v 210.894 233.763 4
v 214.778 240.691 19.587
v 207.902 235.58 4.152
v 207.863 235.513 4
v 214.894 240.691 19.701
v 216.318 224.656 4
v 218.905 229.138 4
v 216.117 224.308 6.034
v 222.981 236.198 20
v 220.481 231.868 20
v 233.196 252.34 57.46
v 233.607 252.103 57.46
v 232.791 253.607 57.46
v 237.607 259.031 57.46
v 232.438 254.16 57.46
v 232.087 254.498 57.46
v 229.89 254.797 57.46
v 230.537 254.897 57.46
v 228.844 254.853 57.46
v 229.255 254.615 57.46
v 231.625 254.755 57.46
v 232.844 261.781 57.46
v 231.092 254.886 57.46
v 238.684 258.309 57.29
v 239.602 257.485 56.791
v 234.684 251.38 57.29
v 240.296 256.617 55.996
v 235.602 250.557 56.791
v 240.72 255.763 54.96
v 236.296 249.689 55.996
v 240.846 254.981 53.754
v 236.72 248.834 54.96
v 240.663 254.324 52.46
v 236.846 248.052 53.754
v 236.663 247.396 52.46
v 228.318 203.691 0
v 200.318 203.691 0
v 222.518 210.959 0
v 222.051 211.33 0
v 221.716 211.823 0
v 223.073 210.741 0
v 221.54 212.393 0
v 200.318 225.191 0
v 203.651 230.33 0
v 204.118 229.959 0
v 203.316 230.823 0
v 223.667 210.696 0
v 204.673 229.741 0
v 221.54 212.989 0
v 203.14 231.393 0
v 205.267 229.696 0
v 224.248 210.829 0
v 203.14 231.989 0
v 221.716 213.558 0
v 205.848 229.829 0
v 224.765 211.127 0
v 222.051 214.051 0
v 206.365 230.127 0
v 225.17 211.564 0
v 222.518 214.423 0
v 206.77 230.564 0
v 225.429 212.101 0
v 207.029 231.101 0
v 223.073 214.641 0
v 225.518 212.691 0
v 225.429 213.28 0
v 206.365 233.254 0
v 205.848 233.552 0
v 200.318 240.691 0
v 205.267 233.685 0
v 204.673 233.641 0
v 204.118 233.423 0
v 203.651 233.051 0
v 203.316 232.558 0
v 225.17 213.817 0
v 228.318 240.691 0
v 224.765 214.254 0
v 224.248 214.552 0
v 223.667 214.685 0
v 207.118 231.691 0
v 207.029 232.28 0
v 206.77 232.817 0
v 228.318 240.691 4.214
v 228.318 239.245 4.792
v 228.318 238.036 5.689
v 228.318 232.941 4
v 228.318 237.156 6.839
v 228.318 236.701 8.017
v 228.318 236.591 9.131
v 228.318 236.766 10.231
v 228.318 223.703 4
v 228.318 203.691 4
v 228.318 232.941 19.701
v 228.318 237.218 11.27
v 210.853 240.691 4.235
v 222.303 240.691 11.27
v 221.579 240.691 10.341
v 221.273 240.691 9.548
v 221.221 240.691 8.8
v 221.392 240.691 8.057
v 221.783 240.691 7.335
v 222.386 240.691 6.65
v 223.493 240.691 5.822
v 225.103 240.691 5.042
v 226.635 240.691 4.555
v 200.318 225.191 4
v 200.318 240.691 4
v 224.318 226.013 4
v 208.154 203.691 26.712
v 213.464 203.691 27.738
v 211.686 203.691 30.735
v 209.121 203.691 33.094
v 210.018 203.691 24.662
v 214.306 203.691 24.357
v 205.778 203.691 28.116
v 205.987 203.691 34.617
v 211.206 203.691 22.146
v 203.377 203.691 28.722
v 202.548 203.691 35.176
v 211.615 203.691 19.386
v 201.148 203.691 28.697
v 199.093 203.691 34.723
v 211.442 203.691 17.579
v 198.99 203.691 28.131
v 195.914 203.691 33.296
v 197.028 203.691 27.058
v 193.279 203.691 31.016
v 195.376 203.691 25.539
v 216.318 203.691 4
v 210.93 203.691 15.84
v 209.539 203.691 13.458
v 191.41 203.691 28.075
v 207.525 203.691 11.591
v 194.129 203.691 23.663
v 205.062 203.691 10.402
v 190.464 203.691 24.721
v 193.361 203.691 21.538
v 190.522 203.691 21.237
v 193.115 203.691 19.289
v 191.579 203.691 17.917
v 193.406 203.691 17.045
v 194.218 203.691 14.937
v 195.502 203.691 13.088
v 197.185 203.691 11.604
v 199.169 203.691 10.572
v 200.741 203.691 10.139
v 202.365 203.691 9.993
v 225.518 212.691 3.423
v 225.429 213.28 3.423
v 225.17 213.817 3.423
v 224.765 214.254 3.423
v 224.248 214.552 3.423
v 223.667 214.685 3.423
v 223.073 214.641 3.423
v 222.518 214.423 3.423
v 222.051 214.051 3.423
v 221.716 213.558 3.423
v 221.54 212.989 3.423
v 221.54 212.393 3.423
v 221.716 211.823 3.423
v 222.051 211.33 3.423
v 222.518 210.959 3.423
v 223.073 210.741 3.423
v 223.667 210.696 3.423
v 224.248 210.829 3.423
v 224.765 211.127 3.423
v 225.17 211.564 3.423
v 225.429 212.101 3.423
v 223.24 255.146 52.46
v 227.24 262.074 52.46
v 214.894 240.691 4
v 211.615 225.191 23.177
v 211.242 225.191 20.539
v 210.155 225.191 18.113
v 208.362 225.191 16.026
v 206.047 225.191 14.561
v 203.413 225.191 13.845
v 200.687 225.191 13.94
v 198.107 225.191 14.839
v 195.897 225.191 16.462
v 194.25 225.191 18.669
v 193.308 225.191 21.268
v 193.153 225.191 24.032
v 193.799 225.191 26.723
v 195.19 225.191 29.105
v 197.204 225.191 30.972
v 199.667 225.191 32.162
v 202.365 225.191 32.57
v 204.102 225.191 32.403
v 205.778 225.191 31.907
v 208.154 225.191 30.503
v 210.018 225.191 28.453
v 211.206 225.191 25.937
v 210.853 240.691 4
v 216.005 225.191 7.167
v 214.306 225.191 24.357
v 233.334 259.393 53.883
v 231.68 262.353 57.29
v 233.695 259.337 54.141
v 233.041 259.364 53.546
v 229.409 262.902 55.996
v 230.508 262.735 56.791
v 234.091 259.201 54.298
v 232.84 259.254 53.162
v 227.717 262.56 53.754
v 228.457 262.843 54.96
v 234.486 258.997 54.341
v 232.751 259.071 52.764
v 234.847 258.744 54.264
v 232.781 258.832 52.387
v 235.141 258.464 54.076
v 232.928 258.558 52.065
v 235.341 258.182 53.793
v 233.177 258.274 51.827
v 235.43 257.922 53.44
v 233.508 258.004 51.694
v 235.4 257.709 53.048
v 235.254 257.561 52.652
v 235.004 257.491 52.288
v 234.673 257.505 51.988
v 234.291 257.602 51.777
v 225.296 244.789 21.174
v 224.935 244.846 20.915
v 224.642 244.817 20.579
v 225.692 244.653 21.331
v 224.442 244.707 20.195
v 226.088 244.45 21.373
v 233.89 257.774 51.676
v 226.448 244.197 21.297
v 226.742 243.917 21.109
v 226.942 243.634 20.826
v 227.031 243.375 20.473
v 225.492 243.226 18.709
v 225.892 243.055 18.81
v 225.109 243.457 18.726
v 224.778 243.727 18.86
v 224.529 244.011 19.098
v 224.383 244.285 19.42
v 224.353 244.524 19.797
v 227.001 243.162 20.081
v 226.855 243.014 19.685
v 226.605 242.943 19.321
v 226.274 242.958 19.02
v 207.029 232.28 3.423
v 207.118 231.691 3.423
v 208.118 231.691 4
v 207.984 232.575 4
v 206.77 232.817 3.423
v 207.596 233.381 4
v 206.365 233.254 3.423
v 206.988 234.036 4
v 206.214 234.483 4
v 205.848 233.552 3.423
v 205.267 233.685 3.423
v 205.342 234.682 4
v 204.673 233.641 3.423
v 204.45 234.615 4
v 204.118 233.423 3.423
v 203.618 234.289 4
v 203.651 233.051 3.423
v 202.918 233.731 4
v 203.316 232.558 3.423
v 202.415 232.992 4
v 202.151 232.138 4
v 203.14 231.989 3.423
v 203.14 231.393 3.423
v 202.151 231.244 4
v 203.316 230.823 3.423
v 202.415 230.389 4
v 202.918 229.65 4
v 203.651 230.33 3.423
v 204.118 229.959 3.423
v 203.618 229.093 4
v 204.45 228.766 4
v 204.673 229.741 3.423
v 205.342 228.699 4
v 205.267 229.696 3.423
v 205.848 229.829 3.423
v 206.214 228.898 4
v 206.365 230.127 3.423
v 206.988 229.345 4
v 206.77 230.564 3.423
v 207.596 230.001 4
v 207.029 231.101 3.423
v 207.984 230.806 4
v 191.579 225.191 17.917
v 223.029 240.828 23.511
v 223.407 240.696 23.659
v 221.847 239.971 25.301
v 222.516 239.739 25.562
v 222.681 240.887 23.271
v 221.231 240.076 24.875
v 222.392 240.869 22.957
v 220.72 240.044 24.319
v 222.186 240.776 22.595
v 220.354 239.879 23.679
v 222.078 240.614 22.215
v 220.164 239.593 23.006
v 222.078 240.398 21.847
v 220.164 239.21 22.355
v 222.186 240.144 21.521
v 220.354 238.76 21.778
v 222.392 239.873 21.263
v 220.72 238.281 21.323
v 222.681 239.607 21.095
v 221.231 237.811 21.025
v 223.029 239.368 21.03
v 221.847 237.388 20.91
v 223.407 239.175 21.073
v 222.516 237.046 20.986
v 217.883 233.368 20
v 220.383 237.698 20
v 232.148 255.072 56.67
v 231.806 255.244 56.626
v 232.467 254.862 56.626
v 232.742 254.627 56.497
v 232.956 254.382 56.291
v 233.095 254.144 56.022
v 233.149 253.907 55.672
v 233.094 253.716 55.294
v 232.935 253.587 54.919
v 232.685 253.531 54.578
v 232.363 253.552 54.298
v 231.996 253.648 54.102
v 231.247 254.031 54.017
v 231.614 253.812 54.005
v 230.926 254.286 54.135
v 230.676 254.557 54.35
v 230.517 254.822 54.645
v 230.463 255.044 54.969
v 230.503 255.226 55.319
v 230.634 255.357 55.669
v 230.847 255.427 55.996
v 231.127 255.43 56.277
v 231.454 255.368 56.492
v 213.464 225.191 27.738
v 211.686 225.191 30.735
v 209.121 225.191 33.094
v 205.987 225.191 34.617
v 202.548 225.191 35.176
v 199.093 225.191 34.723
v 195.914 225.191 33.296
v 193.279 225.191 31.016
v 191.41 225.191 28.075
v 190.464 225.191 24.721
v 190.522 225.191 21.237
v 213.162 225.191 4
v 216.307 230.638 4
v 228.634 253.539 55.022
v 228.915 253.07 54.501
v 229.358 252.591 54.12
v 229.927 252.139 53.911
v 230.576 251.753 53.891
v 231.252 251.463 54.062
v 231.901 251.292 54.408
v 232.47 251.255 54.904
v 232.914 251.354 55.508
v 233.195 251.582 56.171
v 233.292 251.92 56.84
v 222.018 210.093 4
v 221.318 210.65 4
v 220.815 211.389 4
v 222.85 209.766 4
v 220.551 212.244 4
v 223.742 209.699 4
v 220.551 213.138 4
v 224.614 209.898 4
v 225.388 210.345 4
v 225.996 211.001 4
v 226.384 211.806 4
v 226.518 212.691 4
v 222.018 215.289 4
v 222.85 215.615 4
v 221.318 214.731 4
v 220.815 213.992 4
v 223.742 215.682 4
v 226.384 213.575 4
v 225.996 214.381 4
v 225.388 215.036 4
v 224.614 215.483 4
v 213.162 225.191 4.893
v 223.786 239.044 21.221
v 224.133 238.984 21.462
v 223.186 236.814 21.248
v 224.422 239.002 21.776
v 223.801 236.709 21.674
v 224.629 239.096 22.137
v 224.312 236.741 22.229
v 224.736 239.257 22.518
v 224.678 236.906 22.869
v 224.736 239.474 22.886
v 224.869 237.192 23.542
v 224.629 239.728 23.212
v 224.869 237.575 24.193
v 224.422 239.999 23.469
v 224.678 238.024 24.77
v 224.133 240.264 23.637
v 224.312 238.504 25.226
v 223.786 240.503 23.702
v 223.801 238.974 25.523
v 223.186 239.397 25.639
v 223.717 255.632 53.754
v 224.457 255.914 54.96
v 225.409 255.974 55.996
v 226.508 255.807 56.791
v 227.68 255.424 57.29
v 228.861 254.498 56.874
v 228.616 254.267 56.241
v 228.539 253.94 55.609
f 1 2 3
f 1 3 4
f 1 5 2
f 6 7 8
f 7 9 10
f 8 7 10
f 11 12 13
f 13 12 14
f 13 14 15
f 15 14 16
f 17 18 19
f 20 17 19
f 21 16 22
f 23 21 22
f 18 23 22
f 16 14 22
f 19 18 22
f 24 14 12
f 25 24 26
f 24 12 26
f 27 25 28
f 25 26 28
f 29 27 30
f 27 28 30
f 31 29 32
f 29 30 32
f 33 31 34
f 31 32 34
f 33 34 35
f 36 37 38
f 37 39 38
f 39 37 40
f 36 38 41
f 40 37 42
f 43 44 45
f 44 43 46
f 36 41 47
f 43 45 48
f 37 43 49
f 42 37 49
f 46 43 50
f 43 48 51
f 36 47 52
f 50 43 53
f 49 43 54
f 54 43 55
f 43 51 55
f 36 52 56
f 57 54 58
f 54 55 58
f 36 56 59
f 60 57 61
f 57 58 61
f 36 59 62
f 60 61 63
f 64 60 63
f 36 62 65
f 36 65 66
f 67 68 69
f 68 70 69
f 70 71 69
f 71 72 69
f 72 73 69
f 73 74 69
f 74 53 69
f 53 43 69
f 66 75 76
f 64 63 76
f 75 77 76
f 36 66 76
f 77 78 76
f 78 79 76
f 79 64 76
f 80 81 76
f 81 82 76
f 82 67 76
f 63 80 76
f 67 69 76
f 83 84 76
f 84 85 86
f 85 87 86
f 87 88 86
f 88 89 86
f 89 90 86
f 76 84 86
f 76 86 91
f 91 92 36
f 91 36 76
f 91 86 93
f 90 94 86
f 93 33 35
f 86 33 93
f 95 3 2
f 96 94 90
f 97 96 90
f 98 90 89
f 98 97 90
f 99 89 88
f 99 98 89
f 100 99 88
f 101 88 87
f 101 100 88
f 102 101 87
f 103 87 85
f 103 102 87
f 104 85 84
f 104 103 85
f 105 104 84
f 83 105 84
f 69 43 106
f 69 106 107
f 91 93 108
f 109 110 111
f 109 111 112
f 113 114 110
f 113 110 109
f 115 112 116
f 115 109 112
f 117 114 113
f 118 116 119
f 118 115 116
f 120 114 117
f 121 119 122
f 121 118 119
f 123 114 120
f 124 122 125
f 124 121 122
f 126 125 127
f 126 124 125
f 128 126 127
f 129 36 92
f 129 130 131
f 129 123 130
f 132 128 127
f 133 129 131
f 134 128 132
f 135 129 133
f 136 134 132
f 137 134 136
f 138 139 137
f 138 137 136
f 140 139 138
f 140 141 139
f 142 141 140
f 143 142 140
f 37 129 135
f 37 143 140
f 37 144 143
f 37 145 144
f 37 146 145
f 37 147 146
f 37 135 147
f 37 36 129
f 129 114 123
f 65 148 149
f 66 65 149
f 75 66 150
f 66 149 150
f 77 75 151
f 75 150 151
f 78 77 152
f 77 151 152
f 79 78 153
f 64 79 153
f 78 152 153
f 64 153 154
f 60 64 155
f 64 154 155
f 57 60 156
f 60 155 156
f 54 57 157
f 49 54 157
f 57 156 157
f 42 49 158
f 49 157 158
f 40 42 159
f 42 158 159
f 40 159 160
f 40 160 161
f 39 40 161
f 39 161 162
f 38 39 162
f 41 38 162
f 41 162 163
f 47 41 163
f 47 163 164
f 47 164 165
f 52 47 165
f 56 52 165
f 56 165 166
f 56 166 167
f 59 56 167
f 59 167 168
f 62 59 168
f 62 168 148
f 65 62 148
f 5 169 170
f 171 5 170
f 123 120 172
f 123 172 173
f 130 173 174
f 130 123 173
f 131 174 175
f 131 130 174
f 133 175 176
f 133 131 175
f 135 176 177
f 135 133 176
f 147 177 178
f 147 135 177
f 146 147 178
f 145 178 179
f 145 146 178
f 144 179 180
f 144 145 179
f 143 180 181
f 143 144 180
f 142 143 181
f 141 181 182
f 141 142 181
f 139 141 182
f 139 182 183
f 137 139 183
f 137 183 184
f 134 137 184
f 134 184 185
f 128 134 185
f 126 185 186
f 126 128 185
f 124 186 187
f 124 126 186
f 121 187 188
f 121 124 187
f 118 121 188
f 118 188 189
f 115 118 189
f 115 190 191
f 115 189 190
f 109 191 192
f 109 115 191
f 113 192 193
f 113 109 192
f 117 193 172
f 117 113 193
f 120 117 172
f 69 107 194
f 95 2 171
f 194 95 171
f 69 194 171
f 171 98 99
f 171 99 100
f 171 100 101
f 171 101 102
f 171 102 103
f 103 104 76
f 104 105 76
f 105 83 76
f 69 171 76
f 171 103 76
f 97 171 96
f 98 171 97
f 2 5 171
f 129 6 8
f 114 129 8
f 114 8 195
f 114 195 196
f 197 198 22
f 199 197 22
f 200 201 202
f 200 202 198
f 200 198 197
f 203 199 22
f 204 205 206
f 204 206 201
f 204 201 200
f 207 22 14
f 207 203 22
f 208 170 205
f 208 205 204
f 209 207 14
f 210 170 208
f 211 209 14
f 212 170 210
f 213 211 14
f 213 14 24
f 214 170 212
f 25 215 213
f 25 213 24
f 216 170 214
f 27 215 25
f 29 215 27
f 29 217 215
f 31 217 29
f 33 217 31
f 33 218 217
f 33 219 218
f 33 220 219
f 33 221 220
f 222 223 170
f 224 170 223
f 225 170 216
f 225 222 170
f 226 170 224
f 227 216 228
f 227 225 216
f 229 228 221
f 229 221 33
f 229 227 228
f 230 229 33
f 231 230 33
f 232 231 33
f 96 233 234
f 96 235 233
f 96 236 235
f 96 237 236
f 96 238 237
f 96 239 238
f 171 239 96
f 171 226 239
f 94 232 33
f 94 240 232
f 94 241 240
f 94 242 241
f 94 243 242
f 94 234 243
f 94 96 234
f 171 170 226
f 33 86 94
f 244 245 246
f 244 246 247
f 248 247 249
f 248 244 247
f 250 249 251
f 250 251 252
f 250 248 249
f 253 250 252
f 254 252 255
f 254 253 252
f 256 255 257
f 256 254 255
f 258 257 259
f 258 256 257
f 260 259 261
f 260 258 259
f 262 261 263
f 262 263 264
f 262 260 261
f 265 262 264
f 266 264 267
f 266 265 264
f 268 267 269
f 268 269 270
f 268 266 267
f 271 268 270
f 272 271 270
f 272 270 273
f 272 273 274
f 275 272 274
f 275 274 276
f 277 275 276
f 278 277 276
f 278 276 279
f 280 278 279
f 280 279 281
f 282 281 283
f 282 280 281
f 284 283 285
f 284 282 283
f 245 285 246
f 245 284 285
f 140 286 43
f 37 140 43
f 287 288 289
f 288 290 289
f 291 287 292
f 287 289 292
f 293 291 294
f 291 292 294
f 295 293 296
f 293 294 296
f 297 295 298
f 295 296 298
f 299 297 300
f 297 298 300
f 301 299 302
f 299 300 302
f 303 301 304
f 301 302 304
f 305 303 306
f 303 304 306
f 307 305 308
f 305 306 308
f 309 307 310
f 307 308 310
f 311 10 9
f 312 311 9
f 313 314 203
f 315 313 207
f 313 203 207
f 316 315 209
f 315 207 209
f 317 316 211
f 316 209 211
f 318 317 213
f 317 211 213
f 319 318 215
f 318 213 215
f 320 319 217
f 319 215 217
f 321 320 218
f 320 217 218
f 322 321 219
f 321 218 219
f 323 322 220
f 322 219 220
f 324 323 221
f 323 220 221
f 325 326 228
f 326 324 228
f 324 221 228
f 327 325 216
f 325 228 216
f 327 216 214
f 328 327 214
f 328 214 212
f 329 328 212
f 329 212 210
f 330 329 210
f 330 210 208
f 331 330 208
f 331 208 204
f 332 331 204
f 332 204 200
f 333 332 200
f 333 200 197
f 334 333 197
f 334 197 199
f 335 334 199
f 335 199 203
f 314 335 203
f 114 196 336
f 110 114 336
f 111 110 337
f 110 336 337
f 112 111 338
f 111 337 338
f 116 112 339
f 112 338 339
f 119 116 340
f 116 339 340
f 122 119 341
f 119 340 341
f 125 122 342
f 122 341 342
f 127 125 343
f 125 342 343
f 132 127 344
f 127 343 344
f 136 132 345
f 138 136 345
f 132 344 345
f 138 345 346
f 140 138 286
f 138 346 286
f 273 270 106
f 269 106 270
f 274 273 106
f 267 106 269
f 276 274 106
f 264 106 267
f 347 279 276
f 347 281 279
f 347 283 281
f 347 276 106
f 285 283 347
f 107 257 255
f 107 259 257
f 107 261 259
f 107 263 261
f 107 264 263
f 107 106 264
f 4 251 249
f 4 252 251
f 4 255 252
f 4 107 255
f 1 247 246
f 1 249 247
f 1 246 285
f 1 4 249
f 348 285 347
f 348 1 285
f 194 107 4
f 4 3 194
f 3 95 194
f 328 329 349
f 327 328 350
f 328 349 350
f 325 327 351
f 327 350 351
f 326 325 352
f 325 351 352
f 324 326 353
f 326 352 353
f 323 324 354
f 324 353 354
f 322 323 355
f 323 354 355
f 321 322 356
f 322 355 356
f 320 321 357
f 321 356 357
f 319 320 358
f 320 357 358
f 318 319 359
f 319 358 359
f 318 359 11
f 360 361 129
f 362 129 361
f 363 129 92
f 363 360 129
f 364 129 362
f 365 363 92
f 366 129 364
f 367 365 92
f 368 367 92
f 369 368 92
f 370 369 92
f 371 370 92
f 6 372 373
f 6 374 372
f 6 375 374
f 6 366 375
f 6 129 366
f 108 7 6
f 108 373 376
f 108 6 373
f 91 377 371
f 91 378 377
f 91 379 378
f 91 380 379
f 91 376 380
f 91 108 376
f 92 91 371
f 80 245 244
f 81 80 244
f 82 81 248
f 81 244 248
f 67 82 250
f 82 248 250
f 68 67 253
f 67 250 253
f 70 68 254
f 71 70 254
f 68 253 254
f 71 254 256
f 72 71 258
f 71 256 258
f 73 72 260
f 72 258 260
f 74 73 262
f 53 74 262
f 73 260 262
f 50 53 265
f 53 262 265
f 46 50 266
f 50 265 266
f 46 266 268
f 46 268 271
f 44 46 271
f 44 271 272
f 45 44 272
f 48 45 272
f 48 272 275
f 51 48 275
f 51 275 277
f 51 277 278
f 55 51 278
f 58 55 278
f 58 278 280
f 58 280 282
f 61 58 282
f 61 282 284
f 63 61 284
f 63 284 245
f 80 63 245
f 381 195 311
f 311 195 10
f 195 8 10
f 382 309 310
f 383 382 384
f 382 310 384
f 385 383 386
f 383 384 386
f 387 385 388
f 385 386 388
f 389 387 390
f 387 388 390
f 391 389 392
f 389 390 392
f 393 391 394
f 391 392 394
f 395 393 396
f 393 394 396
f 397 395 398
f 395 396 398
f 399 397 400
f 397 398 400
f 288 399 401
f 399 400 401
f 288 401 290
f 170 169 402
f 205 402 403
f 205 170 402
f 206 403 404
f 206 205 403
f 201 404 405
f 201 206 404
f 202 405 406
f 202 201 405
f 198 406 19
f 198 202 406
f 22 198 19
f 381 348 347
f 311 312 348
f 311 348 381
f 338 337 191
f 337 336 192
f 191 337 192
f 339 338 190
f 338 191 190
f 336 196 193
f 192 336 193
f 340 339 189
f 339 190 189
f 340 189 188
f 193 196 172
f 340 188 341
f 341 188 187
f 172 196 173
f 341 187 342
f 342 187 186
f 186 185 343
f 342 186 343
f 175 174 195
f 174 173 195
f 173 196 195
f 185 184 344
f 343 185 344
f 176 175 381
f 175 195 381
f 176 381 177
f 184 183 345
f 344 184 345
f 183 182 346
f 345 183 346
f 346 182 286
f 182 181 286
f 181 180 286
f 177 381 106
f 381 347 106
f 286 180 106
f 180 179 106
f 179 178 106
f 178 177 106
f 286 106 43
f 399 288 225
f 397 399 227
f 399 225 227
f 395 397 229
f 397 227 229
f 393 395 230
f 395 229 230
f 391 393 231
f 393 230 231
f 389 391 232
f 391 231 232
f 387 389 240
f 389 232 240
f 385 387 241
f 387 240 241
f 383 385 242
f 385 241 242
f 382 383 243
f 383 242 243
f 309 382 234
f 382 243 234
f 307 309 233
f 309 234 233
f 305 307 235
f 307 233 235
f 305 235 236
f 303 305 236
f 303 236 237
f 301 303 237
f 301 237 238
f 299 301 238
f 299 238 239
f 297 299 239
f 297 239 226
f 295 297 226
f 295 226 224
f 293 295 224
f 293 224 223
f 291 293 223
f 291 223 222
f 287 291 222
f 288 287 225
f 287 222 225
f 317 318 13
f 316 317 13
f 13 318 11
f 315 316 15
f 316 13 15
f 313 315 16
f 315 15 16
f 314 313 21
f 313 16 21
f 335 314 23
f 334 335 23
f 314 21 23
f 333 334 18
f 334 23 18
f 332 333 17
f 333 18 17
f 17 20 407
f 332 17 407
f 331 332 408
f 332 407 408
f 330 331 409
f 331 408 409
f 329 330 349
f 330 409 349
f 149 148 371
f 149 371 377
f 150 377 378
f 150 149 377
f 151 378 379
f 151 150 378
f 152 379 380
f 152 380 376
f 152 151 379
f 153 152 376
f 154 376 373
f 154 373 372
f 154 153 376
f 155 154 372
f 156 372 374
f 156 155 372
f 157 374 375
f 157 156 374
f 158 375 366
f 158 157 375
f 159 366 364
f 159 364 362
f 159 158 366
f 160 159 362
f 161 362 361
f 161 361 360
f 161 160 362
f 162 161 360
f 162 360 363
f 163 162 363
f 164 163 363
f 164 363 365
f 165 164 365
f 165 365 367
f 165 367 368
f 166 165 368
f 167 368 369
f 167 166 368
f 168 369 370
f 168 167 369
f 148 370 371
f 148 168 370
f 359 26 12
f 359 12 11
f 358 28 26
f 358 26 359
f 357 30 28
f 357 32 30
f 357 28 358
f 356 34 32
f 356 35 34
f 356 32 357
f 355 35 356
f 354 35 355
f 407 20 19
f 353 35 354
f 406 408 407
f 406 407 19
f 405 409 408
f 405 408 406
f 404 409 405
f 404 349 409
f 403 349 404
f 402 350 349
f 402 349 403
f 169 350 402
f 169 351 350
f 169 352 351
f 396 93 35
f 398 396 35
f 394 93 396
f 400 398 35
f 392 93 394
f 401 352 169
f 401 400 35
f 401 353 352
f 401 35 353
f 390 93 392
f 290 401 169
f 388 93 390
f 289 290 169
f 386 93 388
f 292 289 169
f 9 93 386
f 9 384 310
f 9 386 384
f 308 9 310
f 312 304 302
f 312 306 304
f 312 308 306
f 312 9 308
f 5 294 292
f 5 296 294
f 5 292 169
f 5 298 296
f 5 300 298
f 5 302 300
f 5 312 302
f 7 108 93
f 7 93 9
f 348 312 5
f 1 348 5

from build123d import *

# Parameters (mm, degrees)
SKETCH1_W                       = 28
SKETCH1_H                       = 37
BOSS_EXTRUDE1_DEPTH             = 4
EXTRUDE_THIN1_DEPTH             = 60
BOSS_EXTRUDE2_DEPTH             = 18.5
BOSS_EXTRUDE2_DEPTH_BACK        = 3
SKETCH5_R                       = 12
BOSS_EXTRUDE4_REACH             = 356.551
BOSS_EXTRUDE4_DIRECTION_2_DEPTH = 19
CUT_EXTRUDE2_DEPTH              = 363.265046463
CHAMFER1_START                  = 52.77449686
CHAMFER1_DEPTH                  = 8.045724116
FILLET1_R                       = 5
SKETCH12_R                      = 2
CUT_EXTRUDE3_DEPTH              = 11
CHAMFER3_SIZE                   = 1
CHAMFER3_SIZE2                  = 0.577350269
RIB2_START                      = -1.5
RIB2_DEPTH                      = 3
SKETCH13_R                      = 1.5
CUT_EXTRUDE6_DEPTH              = 11
FILLET2_R                       = 5
CUT_REVOLVE_START               = 202.331523811
CUT_REVOLVE_3_OUTLINE_R         = 9.25
CUT_REVOLVE_3_DEPTH             = 25.093721499


with BuildPart() as part:
    # Sketch1 → Boss-Extrude1 (new body)
    with BuildSketch(Plane.XY):
        with Locations((214.317546036, 222.190706617)):
            Rectangle(SKETCH1_W, SKETCH1_H)
    extrude(amount=BOSS_EXTRUDE1_DEPTH)

    # Sketch4 → Extrude-Thin1 (add, along a direction that is not the sketch's normal)
    with BuildSketch(Plane.XY.offset(4)):
        Polygon((214.894152277, 240.690706617), (228.317546036, 232.940706617), (224.317546036, 226.012503387), (210.894152277, 233.762503387), align=None)
    extrude(amount=EXTRUDE_THIN1_DEPTH, dir=(0.22699524986977232, 0.3931673058512374, 0.8910065241883693))

    # Sketch5 → Boss-Extrude2 (add, two sides: drawn at the far end of the back side and taken through both)
    with BuildSketch(Plane(origin=(0, 222.190706617, 0), x_dir=(-1, 0, 0), z_dir=(0, -1, 0)).offset(-BOSS_EXTRUDE2_DEPTH_BACK)):
        with BuildLine():
            Line((-191.578997844, -17.916678927), (-200.317546036, 0))
            Line((-200.317546036, 0), (-216.317546036, 0))
            Line((-216.317546036, 0), (-216.317546036, -4))
            Line((-216.317546036, -4), (-214.306389256, -24.35692569))
            ThreePointArc((-214.306389256, -24.35692569), (-205.636142491, -11.631721126), (-191.578997844, -17.916678927))
        make_face()
        with Locations((-202.3645264, -23.177132689)):
            Circle(SKETCH5_R)
    extrude(amount=BOSS_EXTRUDE2_DEPTH + BOSS_EXTRUDE2_DEPTH_BACK)

    # Boss-Extrude4: up to this face of the body (flat: up to its plane)
    boss_extrude4_end = Plane(part.part.faces().sort_by_distance((228.317546036, 222.190706617, 2))[0])
    # Sketch7 → Boss-Extrude4 (add, up to the picked face)
    with BuildSketch(Plane(origin=(70.371874774, -40.629220844, 0), x_dir=(0, 0, -1), z_dir=(0.8660254037844386, -0.5, 0)), mode=Mode.PRIVATE) as boss_extrude4_sk1:
        Polygon((-4, 315.891342524), (-19.700884044, 315.891342524), (-4, 307.891342524), align=None)
    boss_extrude4_tool1 = split(extrude(boss_extrude4_sk1.sketch, amount=BOSS_EXTRUDE4_REACH, mode=Mode.PRIVATE), bisect_by=boss_extrude4_end, keep=Keep.BOTH, mode=Mode.PRIVATE)
    add(boss_extrude4_tool1.solids().sort_by(Axis((226.984213, 230.631306, 9.233628), (0.8660254037844386, -0.5, 0)))[0])

    # Sketch7 → Boss-Extrude4 direction 2 (add)
    with BuildSketch(Plane(origin=(70.371874774, -40.629220844, 0), x_dir=(0, 0, -1), z_dir=(0.8660254037844386, -0.5, 0))):
        Polygon((-4, 315.891342524), (-19.700884044, 315.891342524), (-4, 307.891342524), align=None)
    extrude(amount=-BOSS_EXTRUDE4_DIRECTION_2_DEPTH)

    # Sketch8 → Cut-Extrude2 (cut, through all)
    with BuildSketch(Plane(origin=(0, 0, 4), x_dir=(-1, 0, 0), z_dir=(0, 0, -1))):
        Polygon((-214.894152277, 240.690706617), (-210.852700393, 240.690706617), (-211.863063364, 242.440706617), align=None)
    extrude(amount=-CUT_EXTRUDE2_DEPTH, mode=Mode.SUBTRACT)

    # Chamfer1: read off the stored shape, not the designer's step
    # Chamfer1 outline → Chamfer1 (cut)
    with BuildSketch(Plane(origin=(0, 0, 0), x_dir=(0.5316074109578968, 0.7735134037427047, 0.3450660441785277), z_dir=(0.8469908857919558, -0.48548982616312697, -0.21657808771308096)).offset(CHAMFER1_START)):
        Polygon((307.114108085, -80.169957731), (294.178723025, -92.183926772), (299.729695769, -94.190354162), align=None)
    extrude(amount=CHAMFER1_DEPTH, mode=Mode.SUBTRACT)

    # Fillet1
    # the kernel refuses this fillet: 5 mm, written as the material it adds along each edge
    with BuildSketch(Plane(origin=(197.228839574, 250.889779662, 4), x_dir=(0.49999999999999944, 0.8660254037844389, 0), z_dir=(0.866025403784439, -0.4999999999999995, 0))) as fillet1_piece_1_section:
        with BuildLine():
            CenterArc((FILLET1_R * 1.63185168713, FILLET1_R), FILLET1_R, 153, 117)
            Line((FILLET1_R * 0.74084516294, FILLET1_R * 1.45399049974), (0, 0))
            Line((0, 0), (FILLET1_R * 1.63185168713, 0))
        make_face()
    fillet1_piece_1 = extrude(amount=56.296292178, mode=Mode.PRIVATE)
    fillet1_piece_1 = split(fillet1_piece_1, bisect_by=Plane(origin=(228.317546036, 250.889779662, 4), z_dir=(-1, 0, 0)), keep=Keep.TOP, mode=Mode.PRIVATE)
    fillet1_piece_1 = split(fillet1_piece_1, bisect_by=Plane(origin=(197.228839574, 240.690706617, 4), z_dir=(0, -1, 0)), keep=Keep.TOP, mode=Mode.PRIVATE)
    add(fillet1_piece_1)

    # Sketch12 → Cut-Extrude3 (cut)
    with BuildSketch(Plane.XY.offset(4)):
        with Locations((205.117546036, 231.690706617)):
            Circle(SKETCH12_R)
        with Locations((223.517546036, 212.690706617)):
            Circle(SKETCH12_R)
    extrude(amount=-CUT_EXTRUDE3_DEPTH, mode=Mode.SUBTRACT)

    # Chamfer3
    chamfer3_edges = [part.edges().sort_by_distance(p)[0] for p in [
        (203.117546036, 231.690706617, 4),
        (221.517546036, 212.690706617, 4),
    ]]
    chamfer3_side = [part.faces().sort_by_distance(p)[0] for p in [
        (208.956042358, 238.333607157, 4),
    ]]
    chamfer(chamfer3_edges, length=CHAMFER3_SIZE, length2=CHAMFER3_SIZE2, reference=chamfer3_side[0])

    # Rib2: read off the stored shape, not the designer's step
    # Rib2 outline → Rib2 (add)
    with BuildSketch(Plane(origin=(63.660177895, -36.754220844, 0), x_dir=(-0.49999999999999845, -0.8660254037844396, 0), z_dir=(-0.8660254037844396, 0.49999999999999845, 0)).offset(RIB2_START)):
        Polygon((-301.043749716, 4), (-311.043749716, 20), (-316.043749716, 20), (-307.891342524, 4), align=None)
    extrude(amount=RIB2_DEPTH)

    # Sketch13 → Cut-Extrude6 (cut)
    with BuildSketch(Plane(origin=(124.582886752, 215.783889609, -126.956302744), x_dir=(0.8952803155791154, -0.38397537070557247, 0.2259116447376676), z_dir=(0.44550326209418484, 0.7716342848848018, -0.45399049973954403))):
        with Locations(Location((122.316663554, -176.73795859, 0), (0, 0, 270))):
            Circle(SKETCH13_R)
        with Locations(Location((112.935440602, -140.94700085, 0), (0, 0, 270))):
            Circle(SKETCH13_R)
    extrude(amount=-CUT_EXTRUDE6_DEPTH, mode=Mode.SUBTRACT)

    # Fillet2
    fillet2_edges = [part.edges().sort_by_distance(p)[0] for p in [
        (239.937261028, 253.066643353, 57.460391451),
        (226.51386727, 260.816643353, 57.460391451),
    ]]
    fillet(fillet2_edges, radius=FILLET2_R)

    # Chamfer4: read off the stored shape, not the designer's step
    # Chamfer4: loft between two sections, ruled curve by curve
    chamfer4_from = [
        Edge.make_three_point_arc((233.094750309, 254.144111481, 56.022204084), (231.428373697, 255.374841148, 56.47881494), (230.517297529, 254.821743623, 54.644687533)),
        Edge.make_three_point_arc((230.517297529, 254.821743623, 54.644687533), (232.183674141, 253.591013956, 54.188076677), (233.094750309, 254.144111481, 56.022204084)),
    ]
    chamfer4_to = [
        Edge.make_three_point_arc((233.195805822, 252.340022177, 57.460391452), (230.246651896, 254.518167985, 58.268501508), (228.634228967, 253.539295786, 55.022462165)),
        Edge.make_three_point_arc((228.634228967, 253.539295786, 55.022462165), (231.583382893, 251.361149979, 54.214352108), (233.195805822, 252.340022177, 57.460391452)),
    ]
    chamfer4 = Solid(Shell([*[Face.make_surface_from_curves(chamfer4_from[k], chamfer4_to[k]) for k in range(2)], Face(Wire(chamfer4_from)), Face(Wire(chamfer4_to))]))
    add(chamfer4, mode=Mode.SUBTRACT)

    # Chamfer4 2: loft between two sections, ruled curve by curve
    chamfer4_2_from = [
        Edge.make_three_point_arc((223.407199674, 240.696376934, 23.659041313), (222.064279201, 240.511700292, 22.027336946), (223.407199674, 239.175097537, 21.073367514)),
        Edge.make_three_point_arc((223.407199674, 239.175097537, 21.073367514), (224.750120147, 239.359774179, 22.705071881), (223.407199674, 240.696376934, 23.659041313)),
    ]
    chamfer4_2_to = [
        Edge.make_three_point_arc((222.51619315, 239.738649078, 25.562248622), (220.139492014, 239.411808289, 22.674457648), (222.51619315, 237.046288254, 20.986122204)),
        Edge.make_three_point_arc((222.51619315, 237.046288254, 20.986122204), (224.892894286, 237.373129042, 23.873913178), (222.51619315, 239.738649078, 25.562248622)),
    ]
    chamfer4_2 = Solid(Shell([*[Face.make_surface_from_curves(chamfer4_2_from[k], chamfer4_2_to[k]) for k in range(2)], Face(Wire(chamfer4_2_from)), Face(Wire(chamfer4_2_to))]))
    add(chamfer4_2, mode=Mode.SUBTRACT)

    # 切除-旋转3: read off the stored shape, not the designer's step
    # 切除-旋转3 outline → 切除-旋转3 (cut)
    with BuildSketch(Plane(origin=(0, 0, 0), x_dir=(1, 0, 0), z_dir=(0, 0.984807753012207, 0.173648177666937)).offset(CUT_REVOLVE_START)):
        with Locations((202.3645264, 16.278935867)):
            Circle(CUT_REVOLVE_3_OUTLINE_R)
    extrude(amount=CUT_REVOLVE_3_DEPTH, mode=Mode.SUBTRACT)


solid = part.part
